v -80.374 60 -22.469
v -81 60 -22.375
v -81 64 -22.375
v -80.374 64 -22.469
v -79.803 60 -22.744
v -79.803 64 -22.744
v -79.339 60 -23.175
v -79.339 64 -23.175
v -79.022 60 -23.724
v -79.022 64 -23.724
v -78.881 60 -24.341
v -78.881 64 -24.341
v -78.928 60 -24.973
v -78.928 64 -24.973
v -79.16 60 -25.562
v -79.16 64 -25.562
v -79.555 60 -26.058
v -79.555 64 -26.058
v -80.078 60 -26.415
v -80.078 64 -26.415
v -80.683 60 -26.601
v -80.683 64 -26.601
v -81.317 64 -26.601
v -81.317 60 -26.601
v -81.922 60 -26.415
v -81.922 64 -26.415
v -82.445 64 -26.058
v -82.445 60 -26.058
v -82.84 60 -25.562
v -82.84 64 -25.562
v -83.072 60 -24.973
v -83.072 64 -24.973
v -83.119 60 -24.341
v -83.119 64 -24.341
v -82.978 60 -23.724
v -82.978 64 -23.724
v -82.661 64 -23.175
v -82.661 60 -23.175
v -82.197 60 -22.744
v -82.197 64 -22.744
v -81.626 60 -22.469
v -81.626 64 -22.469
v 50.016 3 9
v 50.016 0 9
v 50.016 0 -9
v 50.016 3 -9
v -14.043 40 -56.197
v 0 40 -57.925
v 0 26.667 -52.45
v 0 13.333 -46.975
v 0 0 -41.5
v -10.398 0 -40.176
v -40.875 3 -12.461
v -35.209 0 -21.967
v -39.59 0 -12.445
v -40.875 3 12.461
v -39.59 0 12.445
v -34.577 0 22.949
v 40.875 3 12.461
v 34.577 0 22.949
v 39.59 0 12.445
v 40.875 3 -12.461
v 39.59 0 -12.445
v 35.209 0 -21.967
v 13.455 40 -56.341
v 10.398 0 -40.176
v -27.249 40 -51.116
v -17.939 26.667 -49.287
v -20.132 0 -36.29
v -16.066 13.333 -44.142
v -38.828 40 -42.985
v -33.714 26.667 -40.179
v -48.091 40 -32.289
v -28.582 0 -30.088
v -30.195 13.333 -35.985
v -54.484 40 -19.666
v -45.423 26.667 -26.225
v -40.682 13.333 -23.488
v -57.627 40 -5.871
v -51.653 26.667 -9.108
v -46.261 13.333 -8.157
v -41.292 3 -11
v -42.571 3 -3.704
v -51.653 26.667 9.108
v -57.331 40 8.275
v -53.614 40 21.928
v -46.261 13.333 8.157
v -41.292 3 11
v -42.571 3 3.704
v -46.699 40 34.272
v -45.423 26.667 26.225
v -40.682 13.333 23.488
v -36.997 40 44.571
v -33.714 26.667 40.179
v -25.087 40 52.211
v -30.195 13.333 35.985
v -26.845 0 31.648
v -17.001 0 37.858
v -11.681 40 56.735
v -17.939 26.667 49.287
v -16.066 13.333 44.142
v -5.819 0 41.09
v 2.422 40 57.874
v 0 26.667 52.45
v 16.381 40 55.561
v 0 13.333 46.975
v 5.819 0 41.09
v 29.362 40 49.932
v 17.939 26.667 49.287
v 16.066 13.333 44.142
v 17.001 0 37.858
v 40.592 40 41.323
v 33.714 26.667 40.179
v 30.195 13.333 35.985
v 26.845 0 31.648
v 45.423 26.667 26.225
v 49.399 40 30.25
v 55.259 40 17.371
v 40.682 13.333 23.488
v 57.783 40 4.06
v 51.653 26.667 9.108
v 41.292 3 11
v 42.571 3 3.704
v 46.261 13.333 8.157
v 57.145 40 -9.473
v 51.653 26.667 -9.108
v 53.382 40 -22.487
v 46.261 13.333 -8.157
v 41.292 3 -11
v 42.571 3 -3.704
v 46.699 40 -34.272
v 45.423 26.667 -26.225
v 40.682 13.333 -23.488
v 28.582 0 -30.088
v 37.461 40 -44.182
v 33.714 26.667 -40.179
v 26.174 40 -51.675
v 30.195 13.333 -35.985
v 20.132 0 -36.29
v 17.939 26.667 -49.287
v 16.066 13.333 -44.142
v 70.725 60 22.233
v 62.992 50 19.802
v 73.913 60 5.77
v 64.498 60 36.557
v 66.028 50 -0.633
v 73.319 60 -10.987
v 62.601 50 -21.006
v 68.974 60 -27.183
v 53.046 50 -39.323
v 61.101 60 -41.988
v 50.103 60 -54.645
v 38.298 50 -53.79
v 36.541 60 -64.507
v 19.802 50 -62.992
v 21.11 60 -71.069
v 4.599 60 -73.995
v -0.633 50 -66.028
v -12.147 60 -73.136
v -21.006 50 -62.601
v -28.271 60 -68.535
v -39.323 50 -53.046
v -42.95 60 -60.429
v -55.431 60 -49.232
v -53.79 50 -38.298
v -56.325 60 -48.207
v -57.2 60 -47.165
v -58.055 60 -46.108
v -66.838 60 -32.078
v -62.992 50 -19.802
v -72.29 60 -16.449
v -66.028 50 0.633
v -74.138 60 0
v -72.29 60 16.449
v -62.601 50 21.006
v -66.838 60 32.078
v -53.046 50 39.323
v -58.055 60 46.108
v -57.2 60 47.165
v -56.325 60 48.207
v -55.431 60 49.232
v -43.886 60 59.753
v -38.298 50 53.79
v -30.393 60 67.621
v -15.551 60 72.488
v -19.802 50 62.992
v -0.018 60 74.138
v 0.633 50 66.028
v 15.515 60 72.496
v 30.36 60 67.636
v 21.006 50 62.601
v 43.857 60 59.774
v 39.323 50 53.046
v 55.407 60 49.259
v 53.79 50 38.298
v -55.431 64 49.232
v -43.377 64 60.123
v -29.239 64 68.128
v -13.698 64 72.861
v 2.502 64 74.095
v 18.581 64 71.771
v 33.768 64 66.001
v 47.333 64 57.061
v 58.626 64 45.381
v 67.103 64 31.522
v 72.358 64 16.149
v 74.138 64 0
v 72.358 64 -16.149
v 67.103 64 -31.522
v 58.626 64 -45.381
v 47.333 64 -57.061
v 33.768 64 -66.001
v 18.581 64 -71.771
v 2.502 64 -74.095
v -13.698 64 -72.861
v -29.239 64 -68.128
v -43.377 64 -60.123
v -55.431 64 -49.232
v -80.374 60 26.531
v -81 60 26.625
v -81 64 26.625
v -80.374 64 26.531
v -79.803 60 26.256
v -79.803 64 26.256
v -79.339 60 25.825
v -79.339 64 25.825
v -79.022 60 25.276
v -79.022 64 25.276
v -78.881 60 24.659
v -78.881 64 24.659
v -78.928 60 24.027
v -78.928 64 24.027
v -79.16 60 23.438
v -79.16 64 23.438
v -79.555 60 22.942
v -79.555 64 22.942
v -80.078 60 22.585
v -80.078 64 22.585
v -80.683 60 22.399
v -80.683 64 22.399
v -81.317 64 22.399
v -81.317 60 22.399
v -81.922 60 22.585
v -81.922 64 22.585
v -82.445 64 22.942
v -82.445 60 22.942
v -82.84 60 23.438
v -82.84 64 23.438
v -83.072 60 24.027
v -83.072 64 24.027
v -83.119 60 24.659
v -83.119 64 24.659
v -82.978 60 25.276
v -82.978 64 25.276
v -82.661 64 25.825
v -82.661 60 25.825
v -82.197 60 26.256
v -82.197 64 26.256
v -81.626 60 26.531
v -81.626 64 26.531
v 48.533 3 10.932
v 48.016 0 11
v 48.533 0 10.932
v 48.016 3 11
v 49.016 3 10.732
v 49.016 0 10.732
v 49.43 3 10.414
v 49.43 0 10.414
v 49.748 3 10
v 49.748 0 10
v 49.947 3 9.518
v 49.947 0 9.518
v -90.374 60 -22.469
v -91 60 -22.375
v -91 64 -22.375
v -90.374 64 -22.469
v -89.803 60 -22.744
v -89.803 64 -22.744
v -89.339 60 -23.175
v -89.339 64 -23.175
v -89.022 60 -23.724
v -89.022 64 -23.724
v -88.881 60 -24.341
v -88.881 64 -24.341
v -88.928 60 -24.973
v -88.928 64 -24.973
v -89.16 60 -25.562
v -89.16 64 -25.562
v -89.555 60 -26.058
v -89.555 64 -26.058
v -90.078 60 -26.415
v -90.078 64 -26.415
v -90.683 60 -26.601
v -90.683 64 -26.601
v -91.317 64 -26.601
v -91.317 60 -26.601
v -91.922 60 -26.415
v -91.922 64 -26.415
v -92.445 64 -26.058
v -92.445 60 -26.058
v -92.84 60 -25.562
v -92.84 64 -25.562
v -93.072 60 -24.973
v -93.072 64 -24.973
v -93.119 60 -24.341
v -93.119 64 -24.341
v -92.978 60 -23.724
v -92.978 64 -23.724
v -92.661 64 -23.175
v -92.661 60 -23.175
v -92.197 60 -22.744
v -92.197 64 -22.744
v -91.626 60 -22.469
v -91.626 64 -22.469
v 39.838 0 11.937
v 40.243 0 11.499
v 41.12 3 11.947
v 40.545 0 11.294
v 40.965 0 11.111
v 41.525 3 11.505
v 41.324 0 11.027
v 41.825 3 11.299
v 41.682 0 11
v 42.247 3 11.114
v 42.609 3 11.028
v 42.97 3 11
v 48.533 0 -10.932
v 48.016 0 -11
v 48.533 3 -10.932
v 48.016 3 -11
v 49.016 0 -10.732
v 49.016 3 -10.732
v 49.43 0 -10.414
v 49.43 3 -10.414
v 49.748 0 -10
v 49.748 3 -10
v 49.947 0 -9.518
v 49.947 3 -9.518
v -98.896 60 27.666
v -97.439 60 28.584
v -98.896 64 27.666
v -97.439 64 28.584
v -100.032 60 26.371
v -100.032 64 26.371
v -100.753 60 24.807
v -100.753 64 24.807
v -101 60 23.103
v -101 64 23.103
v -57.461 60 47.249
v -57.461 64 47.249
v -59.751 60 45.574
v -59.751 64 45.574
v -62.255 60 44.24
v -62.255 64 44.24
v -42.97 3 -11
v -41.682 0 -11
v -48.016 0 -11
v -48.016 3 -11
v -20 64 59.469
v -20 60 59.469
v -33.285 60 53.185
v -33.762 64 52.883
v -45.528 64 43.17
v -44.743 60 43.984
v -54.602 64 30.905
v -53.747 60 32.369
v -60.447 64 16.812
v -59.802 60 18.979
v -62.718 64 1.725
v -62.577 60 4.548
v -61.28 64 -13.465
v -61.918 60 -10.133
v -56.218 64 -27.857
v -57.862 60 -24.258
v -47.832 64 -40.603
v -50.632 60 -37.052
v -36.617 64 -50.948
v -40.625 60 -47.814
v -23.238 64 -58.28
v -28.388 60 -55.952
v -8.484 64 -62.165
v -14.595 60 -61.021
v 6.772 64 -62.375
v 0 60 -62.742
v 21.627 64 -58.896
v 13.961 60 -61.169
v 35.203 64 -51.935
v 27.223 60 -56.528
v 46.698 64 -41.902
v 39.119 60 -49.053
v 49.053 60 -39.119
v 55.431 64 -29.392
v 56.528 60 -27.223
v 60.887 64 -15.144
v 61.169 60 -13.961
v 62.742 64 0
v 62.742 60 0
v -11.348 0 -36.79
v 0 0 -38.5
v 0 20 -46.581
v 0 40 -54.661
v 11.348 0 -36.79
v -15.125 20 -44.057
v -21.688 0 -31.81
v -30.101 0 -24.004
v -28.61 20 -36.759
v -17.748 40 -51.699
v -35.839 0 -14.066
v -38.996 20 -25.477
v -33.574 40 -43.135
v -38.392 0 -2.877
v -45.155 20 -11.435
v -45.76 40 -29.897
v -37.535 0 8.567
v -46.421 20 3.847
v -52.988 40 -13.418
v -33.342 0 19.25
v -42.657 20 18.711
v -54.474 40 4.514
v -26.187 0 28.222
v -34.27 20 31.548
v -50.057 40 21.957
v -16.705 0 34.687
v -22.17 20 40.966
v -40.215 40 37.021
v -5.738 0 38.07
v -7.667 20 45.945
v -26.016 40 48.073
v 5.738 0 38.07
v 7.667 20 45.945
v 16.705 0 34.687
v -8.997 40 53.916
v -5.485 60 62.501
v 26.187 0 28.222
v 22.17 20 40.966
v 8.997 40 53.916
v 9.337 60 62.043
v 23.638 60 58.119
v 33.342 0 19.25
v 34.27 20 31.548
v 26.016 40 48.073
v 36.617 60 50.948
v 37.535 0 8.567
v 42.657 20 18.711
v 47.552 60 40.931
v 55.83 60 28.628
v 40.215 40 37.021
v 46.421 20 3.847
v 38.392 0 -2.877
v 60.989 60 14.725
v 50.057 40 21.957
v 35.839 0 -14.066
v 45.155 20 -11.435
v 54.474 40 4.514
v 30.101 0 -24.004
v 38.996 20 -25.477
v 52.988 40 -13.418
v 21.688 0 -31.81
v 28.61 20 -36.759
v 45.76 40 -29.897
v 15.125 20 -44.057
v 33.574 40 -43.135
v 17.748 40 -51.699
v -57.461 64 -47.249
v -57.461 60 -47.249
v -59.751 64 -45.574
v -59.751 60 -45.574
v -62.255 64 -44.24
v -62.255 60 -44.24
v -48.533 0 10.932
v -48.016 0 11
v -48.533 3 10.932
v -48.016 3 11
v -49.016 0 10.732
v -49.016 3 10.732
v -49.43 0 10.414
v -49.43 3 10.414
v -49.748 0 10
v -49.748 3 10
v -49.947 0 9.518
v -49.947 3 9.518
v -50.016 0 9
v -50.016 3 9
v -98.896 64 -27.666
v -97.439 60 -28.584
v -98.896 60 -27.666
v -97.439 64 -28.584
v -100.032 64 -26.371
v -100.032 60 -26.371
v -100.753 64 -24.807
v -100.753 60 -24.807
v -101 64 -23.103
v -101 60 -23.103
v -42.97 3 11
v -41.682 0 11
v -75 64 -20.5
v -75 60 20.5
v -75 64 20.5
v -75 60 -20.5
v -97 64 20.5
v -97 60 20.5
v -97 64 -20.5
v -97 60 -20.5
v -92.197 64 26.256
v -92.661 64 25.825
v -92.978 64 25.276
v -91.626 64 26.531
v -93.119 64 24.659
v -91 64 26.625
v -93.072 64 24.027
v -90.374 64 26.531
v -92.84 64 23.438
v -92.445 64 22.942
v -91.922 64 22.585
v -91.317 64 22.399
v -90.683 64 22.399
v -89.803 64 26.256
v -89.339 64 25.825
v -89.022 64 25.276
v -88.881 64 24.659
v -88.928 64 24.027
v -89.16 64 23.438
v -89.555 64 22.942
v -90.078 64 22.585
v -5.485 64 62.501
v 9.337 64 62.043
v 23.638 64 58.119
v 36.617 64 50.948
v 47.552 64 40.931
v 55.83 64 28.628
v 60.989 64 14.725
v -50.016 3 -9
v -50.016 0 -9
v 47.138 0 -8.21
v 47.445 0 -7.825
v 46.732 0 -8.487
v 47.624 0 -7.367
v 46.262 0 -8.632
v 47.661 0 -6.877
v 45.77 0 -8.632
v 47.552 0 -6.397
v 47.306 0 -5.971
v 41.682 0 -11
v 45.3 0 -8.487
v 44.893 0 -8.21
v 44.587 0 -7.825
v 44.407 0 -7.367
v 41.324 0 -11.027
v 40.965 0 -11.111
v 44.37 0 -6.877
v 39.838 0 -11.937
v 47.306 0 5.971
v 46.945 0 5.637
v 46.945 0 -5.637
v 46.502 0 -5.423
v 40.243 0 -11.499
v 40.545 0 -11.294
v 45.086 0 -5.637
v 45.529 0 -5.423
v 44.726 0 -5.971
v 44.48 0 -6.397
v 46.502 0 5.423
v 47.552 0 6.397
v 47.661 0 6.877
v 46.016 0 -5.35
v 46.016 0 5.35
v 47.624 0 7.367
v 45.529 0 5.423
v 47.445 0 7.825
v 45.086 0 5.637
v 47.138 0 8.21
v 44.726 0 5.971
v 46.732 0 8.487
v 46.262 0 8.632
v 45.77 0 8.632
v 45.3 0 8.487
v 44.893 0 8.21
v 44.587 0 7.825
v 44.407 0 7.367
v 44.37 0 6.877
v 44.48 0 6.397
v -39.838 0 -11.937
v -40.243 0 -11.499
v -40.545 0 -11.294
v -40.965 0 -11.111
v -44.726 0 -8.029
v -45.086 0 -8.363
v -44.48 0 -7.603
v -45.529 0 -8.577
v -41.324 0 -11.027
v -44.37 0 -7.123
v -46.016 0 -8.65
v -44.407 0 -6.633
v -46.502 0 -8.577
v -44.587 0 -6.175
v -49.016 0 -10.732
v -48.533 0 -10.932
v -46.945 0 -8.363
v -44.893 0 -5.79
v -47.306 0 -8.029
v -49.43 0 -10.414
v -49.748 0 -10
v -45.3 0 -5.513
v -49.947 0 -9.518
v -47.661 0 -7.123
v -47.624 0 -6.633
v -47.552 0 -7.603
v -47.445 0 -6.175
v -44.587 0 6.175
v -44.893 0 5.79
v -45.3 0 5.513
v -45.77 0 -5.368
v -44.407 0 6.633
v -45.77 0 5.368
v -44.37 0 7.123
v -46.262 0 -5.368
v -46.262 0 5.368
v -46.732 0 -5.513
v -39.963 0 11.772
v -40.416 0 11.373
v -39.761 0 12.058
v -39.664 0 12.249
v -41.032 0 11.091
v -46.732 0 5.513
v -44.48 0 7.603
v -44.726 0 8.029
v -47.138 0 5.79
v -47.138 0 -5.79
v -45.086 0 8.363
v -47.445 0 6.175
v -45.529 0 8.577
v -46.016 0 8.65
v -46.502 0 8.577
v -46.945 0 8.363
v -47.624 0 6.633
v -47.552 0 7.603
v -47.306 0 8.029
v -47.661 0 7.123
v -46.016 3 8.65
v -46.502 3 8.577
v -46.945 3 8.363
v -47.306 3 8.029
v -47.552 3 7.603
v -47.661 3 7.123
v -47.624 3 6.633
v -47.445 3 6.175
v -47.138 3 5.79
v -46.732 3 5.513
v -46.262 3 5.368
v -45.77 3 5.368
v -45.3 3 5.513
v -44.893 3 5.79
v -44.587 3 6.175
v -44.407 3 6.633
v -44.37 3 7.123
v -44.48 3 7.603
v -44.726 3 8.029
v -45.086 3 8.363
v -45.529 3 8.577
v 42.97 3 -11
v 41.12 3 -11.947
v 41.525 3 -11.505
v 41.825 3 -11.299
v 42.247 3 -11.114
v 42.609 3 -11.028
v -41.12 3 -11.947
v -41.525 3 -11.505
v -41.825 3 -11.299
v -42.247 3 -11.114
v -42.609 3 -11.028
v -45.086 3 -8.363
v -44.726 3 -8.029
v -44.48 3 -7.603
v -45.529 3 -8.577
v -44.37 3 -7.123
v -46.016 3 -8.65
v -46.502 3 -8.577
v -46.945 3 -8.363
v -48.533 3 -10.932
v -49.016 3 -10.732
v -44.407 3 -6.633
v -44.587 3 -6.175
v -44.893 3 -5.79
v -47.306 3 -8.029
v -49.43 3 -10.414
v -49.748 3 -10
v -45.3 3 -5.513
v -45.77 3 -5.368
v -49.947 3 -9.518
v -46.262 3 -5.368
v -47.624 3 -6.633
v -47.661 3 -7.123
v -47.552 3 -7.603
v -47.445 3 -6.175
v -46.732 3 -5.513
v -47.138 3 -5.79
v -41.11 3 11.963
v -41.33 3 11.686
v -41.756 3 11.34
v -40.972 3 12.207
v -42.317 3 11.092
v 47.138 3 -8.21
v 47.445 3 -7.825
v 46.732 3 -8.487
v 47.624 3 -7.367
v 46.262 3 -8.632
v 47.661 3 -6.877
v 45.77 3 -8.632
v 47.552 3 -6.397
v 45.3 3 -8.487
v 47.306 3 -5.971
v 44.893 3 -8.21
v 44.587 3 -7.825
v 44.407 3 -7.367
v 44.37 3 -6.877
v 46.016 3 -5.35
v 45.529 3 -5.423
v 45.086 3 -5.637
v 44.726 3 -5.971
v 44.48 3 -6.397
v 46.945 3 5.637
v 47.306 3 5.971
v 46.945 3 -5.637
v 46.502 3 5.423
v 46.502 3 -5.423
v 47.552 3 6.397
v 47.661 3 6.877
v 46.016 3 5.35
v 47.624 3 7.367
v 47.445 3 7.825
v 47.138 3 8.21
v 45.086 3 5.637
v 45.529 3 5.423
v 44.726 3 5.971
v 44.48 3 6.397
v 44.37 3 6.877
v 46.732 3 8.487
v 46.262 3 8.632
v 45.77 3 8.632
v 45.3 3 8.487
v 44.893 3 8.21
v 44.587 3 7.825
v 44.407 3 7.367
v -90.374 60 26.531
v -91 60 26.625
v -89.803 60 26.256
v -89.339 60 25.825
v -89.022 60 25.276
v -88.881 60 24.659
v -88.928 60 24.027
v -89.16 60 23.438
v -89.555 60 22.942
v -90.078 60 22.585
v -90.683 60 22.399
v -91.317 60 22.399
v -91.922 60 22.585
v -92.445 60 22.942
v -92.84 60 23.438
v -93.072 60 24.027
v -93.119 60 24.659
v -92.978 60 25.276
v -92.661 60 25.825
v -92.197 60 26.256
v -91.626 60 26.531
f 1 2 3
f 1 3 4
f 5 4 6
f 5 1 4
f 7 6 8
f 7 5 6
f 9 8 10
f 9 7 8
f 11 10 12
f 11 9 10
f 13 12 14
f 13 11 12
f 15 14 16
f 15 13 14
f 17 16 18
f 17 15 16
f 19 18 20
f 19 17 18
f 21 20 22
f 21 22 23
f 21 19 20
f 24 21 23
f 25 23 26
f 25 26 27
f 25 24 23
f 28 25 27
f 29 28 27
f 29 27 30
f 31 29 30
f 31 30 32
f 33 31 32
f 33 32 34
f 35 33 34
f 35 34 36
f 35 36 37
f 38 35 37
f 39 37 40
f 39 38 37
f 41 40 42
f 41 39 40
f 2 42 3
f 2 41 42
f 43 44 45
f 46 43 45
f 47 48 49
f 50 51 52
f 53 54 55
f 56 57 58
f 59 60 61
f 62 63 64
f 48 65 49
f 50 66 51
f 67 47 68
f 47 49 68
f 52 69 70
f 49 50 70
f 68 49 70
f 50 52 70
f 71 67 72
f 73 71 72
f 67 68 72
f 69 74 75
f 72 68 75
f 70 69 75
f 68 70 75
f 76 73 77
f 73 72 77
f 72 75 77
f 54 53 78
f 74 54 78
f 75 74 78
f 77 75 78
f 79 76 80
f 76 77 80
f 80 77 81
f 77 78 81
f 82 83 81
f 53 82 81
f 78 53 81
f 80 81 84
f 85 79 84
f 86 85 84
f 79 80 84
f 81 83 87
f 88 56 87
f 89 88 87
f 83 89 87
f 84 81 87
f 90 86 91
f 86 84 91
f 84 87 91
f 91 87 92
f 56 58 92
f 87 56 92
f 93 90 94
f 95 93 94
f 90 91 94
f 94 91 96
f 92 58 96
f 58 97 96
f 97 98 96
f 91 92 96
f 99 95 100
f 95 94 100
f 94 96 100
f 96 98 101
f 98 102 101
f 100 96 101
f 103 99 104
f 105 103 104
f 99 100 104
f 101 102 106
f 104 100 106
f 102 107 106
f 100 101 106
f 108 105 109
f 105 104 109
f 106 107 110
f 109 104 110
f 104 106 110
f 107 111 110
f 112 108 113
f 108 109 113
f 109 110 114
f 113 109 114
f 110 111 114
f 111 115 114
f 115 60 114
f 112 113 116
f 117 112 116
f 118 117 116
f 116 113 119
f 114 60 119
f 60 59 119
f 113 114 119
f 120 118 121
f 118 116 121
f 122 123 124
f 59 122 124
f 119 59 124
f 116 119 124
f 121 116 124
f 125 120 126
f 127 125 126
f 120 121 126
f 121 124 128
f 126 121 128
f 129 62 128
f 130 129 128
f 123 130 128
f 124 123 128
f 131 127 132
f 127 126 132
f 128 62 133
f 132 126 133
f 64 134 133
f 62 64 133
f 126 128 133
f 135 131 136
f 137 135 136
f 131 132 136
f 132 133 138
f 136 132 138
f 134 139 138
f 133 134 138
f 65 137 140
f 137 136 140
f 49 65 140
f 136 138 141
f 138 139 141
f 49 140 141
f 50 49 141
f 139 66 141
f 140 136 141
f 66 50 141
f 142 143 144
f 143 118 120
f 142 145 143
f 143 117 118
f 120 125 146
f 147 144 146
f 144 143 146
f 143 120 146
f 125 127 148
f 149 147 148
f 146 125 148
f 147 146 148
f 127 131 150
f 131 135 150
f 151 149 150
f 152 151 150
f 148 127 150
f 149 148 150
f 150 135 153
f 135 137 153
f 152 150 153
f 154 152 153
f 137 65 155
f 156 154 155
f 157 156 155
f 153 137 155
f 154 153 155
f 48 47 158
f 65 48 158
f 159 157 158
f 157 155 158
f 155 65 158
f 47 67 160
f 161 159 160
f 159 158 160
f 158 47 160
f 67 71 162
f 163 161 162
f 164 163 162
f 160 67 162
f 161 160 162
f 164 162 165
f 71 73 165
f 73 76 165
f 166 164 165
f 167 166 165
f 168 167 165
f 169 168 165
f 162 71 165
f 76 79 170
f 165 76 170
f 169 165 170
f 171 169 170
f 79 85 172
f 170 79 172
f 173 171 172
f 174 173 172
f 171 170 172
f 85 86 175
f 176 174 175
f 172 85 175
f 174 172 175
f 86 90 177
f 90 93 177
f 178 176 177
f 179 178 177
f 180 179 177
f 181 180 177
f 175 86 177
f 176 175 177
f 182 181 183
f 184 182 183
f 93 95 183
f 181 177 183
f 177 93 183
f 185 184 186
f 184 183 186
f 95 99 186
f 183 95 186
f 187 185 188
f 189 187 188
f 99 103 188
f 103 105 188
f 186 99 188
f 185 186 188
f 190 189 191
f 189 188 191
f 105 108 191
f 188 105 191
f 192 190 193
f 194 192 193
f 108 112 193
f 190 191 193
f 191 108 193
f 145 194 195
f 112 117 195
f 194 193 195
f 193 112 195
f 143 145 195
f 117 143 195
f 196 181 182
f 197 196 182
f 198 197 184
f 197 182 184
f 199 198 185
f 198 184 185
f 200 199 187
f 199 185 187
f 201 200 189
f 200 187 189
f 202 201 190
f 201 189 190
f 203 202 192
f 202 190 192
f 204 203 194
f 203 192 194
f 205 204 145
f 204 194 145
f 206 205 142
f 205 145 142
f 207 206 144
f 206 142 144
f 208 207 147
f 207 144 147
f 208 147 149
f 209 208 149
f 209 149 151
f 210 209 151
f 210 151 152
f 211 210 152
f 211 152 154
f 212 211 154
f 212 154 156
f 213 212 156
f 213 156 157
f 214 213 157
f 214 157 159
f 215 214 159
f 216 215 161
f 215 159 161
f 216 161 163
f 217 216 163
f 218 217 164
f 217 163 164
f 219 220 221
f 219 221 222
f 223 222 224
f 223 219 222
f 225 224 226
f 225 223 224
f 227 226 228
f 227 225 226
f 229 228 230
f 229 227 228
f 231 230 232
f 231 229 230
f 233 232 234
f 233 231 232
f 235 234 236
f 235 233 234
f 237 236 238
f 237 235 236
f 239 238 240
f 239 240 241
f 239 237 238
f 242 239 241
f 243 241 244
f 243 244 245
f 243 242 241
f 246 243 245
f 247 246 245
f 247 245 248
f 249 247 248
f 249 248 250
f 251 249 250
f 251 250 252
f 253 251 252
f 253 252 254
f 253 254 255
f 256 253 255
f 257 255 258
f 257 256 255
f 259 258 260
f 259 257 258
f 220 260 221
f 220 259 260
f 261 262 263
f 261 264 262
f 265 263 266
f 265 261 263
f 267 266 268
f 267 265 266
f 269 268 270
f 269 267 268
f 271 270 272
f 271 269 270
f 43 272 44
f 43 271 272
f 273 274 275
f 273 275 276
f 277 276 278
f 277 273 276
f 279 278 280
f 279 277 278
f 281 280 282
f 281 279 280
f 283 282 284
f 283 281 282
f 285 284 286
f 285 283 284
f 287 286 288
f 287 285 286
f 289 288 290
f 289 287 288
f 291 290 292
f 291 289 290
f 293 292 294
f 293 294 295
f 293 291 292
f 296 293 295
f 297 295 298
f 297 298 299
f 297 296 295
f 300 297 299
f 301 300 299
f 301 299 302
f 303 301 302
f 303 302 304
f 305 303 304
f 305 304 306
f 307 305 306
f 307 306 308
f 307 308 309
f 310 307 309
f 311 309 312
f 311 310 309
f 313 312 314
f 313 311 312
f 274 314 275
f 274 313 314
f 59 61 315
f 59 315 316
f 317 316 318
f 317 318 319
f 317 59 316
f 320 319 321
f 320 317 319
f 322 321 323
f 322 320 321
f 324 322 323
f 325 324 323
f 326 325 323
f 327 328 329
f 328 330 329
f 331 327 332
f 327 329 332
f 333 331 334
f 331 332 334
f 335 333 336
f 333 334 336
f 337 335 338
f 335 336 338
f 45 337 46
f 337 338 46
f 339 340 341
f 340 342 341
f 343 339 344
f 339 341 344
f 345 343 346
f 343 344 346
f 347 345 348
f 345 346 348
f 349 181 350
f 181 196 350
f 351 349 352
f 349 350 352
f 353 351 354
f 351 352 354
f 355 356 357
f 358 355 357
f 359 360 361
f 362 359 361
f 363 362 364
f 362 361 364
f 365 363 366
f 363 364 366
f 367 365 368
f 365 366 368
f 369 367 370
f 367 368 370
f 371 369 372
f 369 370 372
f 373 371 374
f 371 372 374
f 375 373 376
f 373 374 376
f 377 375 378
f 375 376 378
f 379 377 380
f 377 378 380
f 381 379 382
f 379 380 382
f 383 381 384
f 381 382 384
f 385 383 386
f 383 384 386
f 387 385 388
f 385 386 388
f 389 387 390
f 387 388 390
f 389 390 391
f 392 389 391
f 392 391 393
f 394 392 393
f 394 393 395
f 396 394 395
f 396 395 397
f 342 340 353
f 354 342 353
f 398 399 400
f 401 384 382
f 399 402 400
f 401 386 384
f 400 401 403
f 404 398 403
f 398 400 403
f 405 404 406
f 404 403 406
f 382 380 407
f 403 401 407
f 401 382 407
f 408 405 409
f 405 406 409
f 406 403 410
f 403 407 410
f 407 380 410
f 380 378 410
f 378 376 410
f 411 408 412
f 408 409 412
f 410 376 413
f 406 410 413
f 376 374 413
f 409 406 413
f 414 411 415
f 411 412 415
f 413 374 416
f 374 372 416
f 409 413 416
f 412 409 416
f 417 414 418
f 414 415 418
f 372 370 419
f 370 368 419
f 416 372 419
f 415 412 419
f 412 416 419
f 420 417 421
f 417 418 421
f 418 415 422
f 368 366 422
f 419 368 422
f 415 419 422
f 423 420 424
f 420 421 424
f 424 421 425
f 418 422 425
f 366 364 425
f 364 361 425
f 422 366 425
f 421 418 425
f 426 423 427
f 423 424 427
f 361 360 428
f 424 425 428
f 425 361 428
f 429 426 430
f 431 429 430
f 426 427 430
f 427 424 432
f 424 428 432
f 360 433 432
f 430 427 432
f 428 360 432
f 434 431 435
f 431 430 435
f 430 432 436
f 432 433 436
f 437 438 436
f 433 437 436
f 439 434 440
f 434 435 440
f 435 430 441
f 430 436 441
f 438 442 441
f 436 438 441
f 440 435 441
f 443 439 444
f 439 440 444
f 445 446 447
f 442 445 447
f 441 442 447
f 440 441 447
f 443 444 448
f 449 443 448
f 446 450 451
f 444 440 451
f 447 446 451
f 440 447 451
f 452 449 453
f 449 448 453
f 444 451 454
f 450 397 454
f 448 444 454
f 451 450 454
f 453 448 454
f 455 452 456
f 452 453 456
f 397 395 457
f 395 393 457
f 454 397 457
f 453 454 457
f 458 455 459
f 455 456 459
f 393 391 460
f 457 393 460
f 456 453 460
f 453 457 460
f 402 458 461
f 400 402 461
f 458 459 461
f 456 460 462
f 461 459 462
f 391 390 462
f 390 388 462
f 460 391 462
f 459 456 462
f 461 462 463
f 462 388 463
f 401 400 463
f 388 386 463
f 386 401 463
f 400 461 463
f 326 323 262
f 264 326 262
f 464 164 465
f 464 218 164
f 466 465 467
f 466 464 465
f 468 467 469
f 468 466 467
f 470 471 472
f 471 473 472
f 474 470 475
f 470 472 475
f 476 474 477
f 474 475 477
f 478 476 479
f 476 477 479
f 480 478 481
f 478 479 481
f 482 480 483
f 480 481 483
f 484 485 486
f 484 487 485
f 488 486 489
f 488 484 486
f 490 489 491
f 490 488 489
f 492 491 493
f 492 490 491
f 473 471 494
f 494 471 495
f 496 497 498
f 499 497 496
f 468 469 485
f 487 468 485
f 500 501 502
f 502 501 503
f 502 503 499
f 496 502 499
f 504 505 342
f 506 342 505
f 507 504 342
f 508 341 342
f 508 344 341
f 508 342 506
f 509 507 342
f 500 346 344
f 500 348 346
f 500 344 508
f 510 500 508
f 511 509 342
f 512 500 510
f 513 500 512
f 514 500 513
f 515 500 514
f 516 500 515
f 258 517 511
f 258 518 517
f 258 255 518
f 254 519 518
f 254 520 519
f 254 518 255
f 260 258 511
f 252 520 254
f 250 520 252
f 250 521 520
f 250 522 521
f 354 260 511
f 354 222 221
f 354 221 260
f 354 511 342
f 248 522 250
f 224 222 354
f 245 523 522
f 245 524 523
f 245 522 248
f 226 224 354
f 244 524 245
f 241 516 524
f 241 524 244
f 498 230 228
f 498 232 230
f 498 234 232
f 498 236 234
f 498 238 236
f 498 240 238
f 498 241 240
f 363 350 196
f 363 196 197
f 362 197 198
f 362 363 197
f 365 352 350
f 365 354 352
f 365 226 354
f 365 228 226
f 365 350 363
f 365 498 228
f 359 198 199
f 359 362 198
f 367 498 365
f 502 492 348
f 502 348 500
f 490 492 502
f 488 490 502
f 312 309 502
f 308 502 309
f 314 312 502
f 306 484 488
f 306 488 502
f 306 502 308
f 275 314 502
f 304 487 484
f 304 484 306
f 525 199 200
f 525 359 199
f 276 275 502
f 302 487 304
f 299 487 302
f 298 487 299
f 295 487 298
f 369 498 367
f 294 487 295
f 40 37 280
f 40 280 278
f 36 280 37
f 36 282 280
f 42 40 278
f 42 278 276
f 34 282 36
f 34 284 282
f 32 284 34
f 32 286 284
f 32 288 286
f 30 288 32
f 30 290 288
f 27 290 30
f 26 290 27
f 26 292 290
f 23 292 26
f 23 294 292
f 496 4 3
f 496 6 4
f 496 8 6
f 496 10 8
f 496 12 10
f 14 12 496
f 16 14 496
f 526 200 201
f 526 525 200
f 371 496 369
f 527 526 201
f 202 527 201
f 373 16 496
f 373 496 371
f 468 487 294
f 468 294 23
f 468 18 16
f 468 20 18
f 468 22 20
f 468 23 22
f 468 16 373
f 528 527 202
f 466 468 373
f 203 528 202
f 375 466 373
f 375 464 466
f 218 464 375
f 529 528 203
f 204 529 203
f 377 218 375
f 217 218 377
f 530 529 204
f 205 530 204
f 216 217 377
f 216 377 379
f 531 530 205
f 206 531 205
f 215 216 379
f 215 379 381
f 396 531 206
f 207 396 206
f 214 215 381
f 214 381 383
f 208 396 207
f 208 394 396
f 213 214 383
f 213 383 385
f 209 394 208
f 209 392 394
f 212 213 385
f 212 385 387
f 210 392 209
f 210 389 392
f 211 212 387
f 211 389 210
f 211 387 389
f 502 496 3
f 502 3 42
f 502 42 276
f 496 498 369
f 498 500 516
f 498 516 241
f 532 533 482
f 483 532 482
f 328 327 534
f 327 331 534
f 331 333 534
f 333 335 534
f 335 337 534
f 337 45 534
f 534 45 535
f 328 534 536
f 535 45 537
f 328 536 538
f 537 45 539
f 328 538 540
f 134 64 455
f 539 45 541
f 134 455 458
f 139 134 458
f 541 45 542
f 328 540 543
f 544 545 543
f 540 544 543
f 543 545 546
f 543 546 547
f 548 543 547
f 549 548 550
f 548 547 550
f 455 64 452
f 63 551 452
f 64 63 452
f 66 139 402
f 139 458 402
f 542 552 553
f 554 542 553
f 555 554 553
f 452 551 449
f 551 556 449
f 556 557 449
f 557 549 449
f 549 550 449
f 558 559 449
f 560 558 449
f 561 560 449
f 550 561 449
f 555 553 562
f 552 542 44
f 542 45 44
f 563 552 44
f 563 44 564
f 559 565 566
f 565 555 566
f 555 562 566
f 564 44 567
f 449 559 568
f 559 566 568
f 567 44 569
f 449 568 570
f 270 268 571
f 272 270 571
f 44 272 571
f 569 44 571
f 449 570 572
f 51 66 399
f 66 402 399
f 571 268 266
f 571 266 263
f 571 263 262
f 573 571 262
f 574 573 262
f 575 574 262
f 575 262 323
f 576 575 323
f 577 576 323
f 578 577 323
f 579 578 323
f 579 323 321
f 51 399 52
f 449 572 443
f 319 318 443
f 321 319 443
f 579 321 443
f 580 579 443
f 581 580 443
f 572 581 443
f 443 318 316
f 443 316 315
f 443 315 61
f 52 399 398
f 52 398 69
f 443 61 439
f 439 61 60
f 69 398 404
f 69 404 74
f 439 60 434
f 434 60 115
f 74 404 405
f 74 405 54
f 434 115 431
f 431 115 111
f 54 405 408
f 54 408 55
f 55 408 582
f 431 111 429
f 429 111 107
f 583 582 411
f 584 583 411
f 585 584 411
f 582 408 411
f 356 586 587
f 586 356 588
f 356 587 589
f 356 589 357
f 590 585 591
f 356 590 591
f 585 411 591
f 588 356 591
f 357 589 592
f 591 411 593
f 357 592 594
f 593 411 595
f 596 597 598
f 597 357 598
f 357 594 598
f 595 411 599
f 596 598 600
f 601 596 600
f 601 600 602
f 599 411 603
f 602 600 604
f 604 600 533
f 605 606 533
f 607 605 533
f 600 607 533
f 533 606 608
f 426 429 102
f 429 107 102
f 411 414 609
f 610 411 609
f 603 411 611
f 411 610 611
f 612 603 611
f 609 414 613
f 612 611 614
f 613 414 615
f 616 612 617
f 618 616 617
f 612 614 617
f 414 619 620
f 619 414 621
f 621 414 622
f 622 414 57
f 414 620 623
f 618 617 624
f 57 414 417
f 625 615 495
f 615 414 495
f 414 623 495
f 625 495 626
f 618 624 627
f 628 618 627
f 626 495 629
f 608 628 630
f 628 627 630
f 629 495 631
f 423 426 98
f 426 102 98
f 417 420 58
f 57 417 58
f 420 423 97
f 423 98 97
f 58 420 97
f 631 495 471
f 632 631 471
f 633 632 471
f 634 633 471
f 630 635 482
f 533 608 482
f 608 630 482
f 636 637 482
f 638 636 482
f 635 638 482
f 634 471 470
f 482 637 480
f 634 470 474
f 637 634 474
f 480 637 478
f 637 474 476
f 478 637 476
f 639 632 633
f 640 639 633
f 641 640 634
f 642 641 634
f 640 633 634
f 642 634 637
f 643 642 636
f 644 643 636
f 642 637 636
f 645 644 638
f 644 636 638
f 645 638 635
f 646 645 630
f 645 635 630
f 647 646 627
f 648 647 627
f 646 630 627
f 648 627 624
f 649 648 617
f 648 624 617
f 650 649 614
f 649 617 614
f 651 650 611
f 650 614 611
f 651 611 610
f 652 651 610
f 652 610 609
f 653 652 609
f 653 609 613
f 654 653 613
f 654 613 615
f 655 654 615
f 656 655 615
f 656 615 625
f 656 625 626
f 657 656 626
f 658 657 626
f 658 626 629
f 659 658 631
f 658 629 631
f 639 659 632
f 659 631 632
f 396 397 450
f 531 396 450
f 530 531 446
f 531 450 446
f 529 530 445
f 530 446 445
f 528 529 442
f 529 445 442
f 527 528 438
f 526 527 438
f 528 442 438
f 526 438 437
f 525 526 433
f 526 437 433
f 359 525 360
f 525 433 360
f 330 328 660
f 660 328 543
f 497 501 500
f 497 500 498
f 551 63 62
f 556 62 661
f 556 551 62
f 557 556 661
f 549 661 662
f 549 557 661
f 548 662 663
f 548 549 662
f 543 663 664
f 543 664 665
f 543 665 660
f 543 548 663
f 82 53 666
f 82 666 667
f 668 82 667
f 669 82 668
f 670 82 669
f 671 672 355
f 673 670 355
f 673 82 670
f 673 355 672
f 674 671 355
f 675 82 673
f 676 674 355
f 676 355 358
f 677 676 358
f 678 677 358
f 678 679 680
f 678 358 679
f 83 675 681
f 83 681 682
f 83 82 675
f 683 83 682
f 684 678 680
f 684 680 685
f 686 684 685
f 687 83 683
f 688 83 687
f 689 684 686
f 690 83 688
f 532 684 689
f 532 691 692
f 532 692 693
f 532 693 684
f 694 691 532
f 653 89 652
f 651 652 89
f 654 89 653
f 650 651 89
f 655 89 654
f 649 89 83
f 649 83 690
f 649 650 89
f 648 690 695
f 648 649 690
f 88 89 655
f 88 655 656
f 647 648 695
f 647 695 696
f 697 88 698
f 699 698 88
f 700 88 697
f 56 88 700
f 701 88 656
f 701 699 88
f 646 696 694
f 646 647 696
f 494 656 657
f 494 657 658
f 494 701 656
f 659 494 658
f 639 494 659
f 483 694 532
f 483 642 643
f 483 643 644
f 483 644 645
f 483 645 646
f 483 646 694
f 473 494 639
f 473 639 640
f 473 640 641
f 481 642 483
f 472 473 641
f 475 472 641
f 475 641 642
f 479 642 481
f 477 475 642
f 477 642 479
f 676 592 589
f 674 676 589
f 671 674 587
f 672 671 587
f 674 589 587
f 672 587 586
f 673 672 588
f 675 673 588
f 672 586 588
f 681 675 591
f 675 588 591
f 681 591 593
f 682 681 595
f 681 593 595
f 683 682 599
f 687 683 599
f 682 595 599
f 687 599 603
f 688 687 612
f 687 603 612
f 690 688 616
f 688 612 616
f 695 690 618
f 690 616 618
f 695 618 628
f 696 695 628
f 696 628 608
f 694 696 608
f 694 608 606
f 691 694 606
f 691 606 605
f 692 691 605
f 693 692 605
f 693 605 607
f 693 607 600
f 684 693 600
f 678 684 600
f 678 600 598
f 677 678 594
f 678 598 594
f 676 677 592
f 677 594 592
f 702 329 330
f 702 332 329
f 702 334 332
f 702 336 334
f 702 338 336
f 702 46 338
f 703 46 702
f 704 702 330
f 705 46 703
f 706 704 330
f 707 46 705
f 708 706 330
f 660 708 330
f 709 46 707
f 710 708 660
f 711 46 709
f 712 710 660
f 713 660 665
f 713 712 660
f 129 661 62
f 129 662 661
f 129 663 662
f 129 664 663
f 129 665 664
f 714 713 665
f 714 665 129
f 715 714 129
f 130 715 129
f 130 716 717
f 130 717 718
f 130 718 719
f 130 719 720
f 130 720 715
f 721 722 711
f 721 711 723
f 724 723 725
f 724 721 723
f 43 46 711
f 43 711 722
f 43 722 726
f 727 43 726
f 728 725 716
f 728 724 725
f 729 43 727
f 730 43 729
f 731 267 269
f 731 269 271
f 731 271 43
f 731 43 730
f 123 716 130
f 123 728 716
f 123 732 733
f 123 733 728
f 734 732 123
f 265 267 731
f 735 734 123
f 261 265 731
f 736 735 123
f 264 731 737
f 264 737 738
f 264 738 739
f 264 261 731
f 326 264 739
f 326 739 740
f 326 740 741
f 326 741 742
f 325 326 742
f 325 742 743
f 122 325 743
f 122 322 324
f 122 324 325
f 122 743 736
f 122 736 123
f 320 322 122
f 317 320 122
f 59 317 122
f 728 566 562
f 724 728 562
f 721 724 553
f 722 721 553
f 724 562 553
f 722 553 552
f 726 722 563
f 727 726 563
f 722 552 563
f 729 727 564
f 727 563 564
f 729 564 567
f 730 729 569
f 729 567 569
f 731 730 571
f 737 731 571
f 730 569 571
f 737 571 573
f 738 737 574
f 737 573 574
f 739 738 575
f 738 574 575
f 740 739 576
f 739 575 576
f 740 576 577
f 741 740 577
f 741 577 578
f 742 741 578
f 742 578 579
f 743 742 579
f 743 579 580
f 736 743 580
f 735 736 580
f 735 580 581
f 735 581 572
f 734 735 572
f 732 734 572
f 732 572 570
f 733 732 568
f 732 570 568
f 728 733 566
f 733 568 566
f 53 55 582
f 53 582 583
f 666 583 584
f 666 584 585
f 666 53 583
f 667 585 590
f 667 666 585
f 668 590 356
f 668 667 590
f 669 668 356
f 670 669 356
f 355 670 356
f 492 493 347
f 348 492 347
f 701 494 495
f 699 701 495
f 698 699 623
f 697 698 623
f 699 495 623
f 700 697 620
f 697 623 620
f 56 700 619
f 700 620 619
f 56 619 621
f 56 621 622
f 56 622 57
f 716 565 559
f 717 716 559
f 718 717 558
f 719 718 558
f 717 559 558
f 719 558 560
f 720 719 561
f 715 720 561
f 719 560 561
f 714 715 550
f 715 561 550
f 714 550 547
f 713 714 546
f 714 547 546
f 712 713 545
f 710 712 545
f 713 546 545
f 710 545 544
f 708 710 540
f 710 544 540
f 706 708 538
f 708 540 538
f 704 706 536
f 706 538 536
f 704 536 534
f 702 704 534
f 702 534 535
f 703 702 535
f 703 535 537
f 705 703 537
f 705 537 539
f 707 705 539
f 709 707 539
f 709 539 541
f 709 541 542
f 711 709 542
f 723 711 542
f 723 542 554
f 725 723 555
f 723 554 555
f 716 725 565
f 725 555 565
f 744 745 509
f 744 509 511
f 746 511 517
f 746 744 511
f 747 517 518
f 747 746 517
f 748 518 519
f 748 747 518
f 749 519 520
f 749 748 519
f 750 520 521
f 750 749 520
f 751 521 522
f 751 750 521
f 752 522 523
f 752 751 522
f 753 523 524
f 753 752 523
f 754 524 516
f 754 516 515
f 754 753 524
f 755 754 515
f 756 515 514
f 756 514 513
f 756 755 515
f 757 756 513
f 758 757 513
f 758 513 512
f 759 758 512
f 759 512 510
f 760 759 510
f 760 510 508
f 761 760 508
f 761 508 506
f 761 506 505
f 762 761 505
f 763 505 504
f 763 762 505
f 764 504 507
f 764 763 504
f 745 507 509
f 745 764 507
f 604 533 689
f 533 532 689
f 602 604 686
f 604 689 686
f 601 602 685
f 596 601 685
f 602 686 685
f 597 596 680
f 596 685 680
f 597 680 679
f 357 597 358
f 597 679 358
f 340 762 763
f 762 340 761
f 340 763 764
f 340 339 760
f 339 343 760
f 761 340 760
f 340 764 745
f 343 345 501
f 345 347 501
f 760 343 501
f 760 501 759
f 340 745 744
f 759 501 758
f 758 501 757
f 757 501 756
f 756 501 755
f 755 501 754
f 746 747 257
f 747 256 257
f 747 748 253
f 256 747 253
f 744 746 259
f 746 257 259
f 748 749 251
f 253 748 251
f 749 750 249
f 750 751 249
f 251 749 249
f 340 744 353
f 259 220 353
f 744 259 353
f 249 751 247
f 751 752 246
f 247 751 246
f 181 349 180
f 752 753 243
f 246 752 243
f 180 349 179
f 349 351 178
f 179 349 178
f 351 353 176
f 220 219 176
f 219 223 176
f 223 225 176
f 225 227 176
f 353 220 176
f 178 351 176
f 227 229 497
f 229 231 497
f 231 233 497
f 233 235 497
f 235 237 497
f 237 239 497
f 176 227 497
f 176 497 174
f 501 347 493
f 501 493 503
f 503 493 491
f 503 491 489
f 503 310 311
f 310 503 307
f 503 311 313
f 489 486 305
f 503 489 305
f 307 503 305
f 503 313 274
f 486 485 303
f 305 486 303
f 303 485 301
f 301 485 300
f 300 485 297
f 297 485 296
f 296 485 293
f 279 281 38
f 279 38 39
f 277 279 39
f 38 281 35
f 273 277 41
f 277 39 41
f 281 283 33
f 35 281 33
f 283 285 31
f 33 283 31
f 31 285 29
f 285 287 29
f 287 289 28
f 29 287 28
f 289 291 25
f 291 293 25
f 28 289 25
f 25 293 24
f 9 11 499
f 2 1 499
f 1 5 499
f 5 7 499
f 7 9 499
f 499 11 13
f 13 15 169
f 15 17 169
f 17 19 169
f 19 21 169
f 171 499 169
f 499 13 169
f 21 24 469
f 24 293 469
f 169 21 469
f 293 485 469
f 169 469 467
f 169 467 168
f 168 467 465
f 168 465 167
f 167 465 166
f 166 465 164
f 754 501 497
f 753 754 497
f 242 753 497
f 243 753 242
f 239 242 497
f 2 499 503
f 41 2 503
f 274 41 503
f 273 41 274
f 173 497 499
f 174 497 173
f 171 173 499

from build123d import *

# Parameters (mm, degrees)
SKETCH3_R           = 1.65
BOSS_EXTRUDE1_DEPTH = 3
FILLET1_R           = 2
SKETCH4_R           = 2.125
SKETCH4_W           = 22
SKETCH4_H           = 41
BOSS_EXTRUDE2_DEPTH = 4
BOSS_EXTRUDE3_DEPTH = 4
FILLET4_R           = 20
FILLET5_R           = 6


with BuildPart() as part:
    # Sketch2 → Revolve1 (revolve)
    with BuildSketch(Plane.XY, mode=Mode.PRIVATE) as revolve1_sk:
        Polygon((38.5, 0), (62.74157355, 60), (66.137606882, 60), (41.5, 0), align=None)
    revolve(revolve1_sk.sketch.rotate(Axis((0, 0, 0), (0, 1, 0)), 90), axis=Axis((0, 0, 0), (0, 1, 0)))

    # Sketch3 → Boss-Extrude1 (add)
    # profile 1 of 2: a face of its own
    with BuildSketch(Plane.XZ):
        with BuildLine():
            Line((-50.015621949, 11), (-40.015621949, 11))
            ThreePointArc((-40.015621949, 11), (-41.5, 0), (-40.015621949, -11))
            Line((-40.015621949, -11), (-50.015621949, -11))
            Line((-50.015621949, -11), (-50.015621949, 11))
        make_face()
        with Locations(Location((-46.015621949, -7, 0), (0, 0, 270))):
            Circle(SKETCH3_R, mode=Mode.SUBTRACT)
        with Locations(Location((-46.015621949, 7, 0), (0, 0, 90))):
            Circle(SKETCH3_R, mode=Mode.SUBTRACT)
    # profile 2 of 2: a face of its own
    with BuildSketch(Plane.XZ):
        with BuildLine():
            Line((50.015621949, -11), (40.015621949, -11))
            ThreePointArc((40.015621949, -11), (41.5, 0), (40.015621949, 11))
            Line((40.015621949, 11), (50.015621949, 11))
            Line((50.015621949, 11), (50.015621949, -11))
        make_face()
        with Locations(Location((46.015621949, 7, 0), (0, 0, 270))):
            Circle(SKETCH3_R, mode=Mode.SUBTRACT)
        with Locations(Location((46.015621949, -7, 0), (0, 0, 90))):
            Circle(SKETCH3_R, mode=Mode.SUBTRACT)
    extrude(amount=-BOSS_EXTRUDE1_DEPTH)

    # Fillet1
    fillet1_edges = [part.edges().sort_by_distance(p)[0] for p in [
        (-40.654005454, 1.499876919, -11),
        (-40.654005454, 1.499876919, 11),
        (-50.015621949, 1.5, -11),
        (-50.015621949, 1.5, 11),
        (40.654005454, 1.499876919, -11),
        (40.654005454, 1.499876919, 11),
        (50.015621949, 1.5, 11),
        (50.015621949, 1.5, -11),
    ]]
    fillet(fillet1_edges, radius=FILLET1_R)



with BuildPart() as body_2:
    # Sketch4 → Boss-Extrude2 (new body)
    with BuildSketch(Plane(origin=(0, 60, 0), x_dir=(1, 0, 0), z_dir=(0, 1, 0))):
        with BuildLine():
            Line((-33.439731634, 57.061084746), (-101, 27))
            Line((-101, 27), (-101, -27))
            Line((-101, -27), (-33.439731634, -57.061084746))
            Line((-33.439731634, -57.061084746), (-20, -63.04112185))
            ThreePointArc((-20, -63.04112185), (66.137606882, 0), (-20, 63.04112185))
            Line((-20, 63.04112185), (-33.439731634, 57.061084746))
        make_face()
        with Locations(Location((-91, -24.5, 0), (0, 0, 270))):
            Circle(SKETCH4_R, mode=Mode.SUBTRACT)
        with Locations(Location((-81, -24.5, 0), (0, 0, 270))):
            Circle(SKETCH4_R, mode=Mode.SUBTRACT)
        with Locations((-86, 0)):
            Rectangle(SKETCH4_W, SKETCH4_H, mode=Mode.SUBTRACT)
        with Locations(Location((-91, 24.5, 0), (0, 0, 270))):
            Circle(SKETCH4_R, mode=Mode.SUBTRACT)
        with Locations(Location((-81, 24.5, 0), (0, 0, 270))):
            Circle(SKETCH4_R, mode=Mode.SUBTRACT)
        with BuildLine():
            ThreePointArc((62.74157355, 0), (36.617438336, -50.947701236), (-20, -59.468521518))
            ThreePointArc((-20, -59.468521518), (-36.617438336, 50.947701236), (62.74157355, 0))
        make_face(mode=Mode.SUBTRACT)
    extrude(amount=BOSS_EXTRUDE2_DEPTH)


with BuildPart() as part_1:
    add(part.part)

    add(body_2.part)  # Revolve5 merges body 2
    # Sketch6 → Revolve5 (revolve)
    with BuildSketch(Plane.XY, mode=Mode.PRIVATE) as revolve5_sk:
        Polygon((-66.137606882, 60), (-74.137606882, 60), (-57.925071255, 40), align=None)
    revolve(revolve5_sk.sketch.rotate(Axis((0, 0, 0), (0, 1, 0)), 162.54936445), axis=Axis((0, 0, 0), (0, 1, 0)))

    # Sketch7 → Boss-Extrude3 (add)
    with BuildSketch(Plane(origin=(0, 60, 0), x_dir=(1, 0, 0), z_dir=(0, 1, 0))):
        with BuildLine():
            Line((-58.055144228, 46.108404688), (-20, 63.04112185))
            ThreePointArc((-20, 63.04112185), (66.137606882, 0), (-20, -63.04112185))
            Line((-20, -63.04112185), (-58.055144228, -46.108404688))
            ThreePointArc((-58.055144228, -46.108404688), (74.137606882, 0), (-58.055144228, 46.108404688))
        make_face()
    extrude(amount=BOSS_EXTRUDE3_DEPTH)

    # Fillet4
    fillet4_edges = [part_1.edges().sort_by_distance(p)[0] for p in [
        (-58.055144228, 62, 46.108404688),
        (-58.055144228, 62, -46.108404688),
    ]]
    fillet(fillet4_edges, radius=FILLET4_R)

    # Fillet5
    fillet5_edges = [part_1.edges().sort_by_distance(p)[0] for p in [
        (-101, 62, -27),
        (-101, 62, 27),
    ]]
    fillet(fillet5_edges, radius=FILLET5_R)


solid = part_1.part
